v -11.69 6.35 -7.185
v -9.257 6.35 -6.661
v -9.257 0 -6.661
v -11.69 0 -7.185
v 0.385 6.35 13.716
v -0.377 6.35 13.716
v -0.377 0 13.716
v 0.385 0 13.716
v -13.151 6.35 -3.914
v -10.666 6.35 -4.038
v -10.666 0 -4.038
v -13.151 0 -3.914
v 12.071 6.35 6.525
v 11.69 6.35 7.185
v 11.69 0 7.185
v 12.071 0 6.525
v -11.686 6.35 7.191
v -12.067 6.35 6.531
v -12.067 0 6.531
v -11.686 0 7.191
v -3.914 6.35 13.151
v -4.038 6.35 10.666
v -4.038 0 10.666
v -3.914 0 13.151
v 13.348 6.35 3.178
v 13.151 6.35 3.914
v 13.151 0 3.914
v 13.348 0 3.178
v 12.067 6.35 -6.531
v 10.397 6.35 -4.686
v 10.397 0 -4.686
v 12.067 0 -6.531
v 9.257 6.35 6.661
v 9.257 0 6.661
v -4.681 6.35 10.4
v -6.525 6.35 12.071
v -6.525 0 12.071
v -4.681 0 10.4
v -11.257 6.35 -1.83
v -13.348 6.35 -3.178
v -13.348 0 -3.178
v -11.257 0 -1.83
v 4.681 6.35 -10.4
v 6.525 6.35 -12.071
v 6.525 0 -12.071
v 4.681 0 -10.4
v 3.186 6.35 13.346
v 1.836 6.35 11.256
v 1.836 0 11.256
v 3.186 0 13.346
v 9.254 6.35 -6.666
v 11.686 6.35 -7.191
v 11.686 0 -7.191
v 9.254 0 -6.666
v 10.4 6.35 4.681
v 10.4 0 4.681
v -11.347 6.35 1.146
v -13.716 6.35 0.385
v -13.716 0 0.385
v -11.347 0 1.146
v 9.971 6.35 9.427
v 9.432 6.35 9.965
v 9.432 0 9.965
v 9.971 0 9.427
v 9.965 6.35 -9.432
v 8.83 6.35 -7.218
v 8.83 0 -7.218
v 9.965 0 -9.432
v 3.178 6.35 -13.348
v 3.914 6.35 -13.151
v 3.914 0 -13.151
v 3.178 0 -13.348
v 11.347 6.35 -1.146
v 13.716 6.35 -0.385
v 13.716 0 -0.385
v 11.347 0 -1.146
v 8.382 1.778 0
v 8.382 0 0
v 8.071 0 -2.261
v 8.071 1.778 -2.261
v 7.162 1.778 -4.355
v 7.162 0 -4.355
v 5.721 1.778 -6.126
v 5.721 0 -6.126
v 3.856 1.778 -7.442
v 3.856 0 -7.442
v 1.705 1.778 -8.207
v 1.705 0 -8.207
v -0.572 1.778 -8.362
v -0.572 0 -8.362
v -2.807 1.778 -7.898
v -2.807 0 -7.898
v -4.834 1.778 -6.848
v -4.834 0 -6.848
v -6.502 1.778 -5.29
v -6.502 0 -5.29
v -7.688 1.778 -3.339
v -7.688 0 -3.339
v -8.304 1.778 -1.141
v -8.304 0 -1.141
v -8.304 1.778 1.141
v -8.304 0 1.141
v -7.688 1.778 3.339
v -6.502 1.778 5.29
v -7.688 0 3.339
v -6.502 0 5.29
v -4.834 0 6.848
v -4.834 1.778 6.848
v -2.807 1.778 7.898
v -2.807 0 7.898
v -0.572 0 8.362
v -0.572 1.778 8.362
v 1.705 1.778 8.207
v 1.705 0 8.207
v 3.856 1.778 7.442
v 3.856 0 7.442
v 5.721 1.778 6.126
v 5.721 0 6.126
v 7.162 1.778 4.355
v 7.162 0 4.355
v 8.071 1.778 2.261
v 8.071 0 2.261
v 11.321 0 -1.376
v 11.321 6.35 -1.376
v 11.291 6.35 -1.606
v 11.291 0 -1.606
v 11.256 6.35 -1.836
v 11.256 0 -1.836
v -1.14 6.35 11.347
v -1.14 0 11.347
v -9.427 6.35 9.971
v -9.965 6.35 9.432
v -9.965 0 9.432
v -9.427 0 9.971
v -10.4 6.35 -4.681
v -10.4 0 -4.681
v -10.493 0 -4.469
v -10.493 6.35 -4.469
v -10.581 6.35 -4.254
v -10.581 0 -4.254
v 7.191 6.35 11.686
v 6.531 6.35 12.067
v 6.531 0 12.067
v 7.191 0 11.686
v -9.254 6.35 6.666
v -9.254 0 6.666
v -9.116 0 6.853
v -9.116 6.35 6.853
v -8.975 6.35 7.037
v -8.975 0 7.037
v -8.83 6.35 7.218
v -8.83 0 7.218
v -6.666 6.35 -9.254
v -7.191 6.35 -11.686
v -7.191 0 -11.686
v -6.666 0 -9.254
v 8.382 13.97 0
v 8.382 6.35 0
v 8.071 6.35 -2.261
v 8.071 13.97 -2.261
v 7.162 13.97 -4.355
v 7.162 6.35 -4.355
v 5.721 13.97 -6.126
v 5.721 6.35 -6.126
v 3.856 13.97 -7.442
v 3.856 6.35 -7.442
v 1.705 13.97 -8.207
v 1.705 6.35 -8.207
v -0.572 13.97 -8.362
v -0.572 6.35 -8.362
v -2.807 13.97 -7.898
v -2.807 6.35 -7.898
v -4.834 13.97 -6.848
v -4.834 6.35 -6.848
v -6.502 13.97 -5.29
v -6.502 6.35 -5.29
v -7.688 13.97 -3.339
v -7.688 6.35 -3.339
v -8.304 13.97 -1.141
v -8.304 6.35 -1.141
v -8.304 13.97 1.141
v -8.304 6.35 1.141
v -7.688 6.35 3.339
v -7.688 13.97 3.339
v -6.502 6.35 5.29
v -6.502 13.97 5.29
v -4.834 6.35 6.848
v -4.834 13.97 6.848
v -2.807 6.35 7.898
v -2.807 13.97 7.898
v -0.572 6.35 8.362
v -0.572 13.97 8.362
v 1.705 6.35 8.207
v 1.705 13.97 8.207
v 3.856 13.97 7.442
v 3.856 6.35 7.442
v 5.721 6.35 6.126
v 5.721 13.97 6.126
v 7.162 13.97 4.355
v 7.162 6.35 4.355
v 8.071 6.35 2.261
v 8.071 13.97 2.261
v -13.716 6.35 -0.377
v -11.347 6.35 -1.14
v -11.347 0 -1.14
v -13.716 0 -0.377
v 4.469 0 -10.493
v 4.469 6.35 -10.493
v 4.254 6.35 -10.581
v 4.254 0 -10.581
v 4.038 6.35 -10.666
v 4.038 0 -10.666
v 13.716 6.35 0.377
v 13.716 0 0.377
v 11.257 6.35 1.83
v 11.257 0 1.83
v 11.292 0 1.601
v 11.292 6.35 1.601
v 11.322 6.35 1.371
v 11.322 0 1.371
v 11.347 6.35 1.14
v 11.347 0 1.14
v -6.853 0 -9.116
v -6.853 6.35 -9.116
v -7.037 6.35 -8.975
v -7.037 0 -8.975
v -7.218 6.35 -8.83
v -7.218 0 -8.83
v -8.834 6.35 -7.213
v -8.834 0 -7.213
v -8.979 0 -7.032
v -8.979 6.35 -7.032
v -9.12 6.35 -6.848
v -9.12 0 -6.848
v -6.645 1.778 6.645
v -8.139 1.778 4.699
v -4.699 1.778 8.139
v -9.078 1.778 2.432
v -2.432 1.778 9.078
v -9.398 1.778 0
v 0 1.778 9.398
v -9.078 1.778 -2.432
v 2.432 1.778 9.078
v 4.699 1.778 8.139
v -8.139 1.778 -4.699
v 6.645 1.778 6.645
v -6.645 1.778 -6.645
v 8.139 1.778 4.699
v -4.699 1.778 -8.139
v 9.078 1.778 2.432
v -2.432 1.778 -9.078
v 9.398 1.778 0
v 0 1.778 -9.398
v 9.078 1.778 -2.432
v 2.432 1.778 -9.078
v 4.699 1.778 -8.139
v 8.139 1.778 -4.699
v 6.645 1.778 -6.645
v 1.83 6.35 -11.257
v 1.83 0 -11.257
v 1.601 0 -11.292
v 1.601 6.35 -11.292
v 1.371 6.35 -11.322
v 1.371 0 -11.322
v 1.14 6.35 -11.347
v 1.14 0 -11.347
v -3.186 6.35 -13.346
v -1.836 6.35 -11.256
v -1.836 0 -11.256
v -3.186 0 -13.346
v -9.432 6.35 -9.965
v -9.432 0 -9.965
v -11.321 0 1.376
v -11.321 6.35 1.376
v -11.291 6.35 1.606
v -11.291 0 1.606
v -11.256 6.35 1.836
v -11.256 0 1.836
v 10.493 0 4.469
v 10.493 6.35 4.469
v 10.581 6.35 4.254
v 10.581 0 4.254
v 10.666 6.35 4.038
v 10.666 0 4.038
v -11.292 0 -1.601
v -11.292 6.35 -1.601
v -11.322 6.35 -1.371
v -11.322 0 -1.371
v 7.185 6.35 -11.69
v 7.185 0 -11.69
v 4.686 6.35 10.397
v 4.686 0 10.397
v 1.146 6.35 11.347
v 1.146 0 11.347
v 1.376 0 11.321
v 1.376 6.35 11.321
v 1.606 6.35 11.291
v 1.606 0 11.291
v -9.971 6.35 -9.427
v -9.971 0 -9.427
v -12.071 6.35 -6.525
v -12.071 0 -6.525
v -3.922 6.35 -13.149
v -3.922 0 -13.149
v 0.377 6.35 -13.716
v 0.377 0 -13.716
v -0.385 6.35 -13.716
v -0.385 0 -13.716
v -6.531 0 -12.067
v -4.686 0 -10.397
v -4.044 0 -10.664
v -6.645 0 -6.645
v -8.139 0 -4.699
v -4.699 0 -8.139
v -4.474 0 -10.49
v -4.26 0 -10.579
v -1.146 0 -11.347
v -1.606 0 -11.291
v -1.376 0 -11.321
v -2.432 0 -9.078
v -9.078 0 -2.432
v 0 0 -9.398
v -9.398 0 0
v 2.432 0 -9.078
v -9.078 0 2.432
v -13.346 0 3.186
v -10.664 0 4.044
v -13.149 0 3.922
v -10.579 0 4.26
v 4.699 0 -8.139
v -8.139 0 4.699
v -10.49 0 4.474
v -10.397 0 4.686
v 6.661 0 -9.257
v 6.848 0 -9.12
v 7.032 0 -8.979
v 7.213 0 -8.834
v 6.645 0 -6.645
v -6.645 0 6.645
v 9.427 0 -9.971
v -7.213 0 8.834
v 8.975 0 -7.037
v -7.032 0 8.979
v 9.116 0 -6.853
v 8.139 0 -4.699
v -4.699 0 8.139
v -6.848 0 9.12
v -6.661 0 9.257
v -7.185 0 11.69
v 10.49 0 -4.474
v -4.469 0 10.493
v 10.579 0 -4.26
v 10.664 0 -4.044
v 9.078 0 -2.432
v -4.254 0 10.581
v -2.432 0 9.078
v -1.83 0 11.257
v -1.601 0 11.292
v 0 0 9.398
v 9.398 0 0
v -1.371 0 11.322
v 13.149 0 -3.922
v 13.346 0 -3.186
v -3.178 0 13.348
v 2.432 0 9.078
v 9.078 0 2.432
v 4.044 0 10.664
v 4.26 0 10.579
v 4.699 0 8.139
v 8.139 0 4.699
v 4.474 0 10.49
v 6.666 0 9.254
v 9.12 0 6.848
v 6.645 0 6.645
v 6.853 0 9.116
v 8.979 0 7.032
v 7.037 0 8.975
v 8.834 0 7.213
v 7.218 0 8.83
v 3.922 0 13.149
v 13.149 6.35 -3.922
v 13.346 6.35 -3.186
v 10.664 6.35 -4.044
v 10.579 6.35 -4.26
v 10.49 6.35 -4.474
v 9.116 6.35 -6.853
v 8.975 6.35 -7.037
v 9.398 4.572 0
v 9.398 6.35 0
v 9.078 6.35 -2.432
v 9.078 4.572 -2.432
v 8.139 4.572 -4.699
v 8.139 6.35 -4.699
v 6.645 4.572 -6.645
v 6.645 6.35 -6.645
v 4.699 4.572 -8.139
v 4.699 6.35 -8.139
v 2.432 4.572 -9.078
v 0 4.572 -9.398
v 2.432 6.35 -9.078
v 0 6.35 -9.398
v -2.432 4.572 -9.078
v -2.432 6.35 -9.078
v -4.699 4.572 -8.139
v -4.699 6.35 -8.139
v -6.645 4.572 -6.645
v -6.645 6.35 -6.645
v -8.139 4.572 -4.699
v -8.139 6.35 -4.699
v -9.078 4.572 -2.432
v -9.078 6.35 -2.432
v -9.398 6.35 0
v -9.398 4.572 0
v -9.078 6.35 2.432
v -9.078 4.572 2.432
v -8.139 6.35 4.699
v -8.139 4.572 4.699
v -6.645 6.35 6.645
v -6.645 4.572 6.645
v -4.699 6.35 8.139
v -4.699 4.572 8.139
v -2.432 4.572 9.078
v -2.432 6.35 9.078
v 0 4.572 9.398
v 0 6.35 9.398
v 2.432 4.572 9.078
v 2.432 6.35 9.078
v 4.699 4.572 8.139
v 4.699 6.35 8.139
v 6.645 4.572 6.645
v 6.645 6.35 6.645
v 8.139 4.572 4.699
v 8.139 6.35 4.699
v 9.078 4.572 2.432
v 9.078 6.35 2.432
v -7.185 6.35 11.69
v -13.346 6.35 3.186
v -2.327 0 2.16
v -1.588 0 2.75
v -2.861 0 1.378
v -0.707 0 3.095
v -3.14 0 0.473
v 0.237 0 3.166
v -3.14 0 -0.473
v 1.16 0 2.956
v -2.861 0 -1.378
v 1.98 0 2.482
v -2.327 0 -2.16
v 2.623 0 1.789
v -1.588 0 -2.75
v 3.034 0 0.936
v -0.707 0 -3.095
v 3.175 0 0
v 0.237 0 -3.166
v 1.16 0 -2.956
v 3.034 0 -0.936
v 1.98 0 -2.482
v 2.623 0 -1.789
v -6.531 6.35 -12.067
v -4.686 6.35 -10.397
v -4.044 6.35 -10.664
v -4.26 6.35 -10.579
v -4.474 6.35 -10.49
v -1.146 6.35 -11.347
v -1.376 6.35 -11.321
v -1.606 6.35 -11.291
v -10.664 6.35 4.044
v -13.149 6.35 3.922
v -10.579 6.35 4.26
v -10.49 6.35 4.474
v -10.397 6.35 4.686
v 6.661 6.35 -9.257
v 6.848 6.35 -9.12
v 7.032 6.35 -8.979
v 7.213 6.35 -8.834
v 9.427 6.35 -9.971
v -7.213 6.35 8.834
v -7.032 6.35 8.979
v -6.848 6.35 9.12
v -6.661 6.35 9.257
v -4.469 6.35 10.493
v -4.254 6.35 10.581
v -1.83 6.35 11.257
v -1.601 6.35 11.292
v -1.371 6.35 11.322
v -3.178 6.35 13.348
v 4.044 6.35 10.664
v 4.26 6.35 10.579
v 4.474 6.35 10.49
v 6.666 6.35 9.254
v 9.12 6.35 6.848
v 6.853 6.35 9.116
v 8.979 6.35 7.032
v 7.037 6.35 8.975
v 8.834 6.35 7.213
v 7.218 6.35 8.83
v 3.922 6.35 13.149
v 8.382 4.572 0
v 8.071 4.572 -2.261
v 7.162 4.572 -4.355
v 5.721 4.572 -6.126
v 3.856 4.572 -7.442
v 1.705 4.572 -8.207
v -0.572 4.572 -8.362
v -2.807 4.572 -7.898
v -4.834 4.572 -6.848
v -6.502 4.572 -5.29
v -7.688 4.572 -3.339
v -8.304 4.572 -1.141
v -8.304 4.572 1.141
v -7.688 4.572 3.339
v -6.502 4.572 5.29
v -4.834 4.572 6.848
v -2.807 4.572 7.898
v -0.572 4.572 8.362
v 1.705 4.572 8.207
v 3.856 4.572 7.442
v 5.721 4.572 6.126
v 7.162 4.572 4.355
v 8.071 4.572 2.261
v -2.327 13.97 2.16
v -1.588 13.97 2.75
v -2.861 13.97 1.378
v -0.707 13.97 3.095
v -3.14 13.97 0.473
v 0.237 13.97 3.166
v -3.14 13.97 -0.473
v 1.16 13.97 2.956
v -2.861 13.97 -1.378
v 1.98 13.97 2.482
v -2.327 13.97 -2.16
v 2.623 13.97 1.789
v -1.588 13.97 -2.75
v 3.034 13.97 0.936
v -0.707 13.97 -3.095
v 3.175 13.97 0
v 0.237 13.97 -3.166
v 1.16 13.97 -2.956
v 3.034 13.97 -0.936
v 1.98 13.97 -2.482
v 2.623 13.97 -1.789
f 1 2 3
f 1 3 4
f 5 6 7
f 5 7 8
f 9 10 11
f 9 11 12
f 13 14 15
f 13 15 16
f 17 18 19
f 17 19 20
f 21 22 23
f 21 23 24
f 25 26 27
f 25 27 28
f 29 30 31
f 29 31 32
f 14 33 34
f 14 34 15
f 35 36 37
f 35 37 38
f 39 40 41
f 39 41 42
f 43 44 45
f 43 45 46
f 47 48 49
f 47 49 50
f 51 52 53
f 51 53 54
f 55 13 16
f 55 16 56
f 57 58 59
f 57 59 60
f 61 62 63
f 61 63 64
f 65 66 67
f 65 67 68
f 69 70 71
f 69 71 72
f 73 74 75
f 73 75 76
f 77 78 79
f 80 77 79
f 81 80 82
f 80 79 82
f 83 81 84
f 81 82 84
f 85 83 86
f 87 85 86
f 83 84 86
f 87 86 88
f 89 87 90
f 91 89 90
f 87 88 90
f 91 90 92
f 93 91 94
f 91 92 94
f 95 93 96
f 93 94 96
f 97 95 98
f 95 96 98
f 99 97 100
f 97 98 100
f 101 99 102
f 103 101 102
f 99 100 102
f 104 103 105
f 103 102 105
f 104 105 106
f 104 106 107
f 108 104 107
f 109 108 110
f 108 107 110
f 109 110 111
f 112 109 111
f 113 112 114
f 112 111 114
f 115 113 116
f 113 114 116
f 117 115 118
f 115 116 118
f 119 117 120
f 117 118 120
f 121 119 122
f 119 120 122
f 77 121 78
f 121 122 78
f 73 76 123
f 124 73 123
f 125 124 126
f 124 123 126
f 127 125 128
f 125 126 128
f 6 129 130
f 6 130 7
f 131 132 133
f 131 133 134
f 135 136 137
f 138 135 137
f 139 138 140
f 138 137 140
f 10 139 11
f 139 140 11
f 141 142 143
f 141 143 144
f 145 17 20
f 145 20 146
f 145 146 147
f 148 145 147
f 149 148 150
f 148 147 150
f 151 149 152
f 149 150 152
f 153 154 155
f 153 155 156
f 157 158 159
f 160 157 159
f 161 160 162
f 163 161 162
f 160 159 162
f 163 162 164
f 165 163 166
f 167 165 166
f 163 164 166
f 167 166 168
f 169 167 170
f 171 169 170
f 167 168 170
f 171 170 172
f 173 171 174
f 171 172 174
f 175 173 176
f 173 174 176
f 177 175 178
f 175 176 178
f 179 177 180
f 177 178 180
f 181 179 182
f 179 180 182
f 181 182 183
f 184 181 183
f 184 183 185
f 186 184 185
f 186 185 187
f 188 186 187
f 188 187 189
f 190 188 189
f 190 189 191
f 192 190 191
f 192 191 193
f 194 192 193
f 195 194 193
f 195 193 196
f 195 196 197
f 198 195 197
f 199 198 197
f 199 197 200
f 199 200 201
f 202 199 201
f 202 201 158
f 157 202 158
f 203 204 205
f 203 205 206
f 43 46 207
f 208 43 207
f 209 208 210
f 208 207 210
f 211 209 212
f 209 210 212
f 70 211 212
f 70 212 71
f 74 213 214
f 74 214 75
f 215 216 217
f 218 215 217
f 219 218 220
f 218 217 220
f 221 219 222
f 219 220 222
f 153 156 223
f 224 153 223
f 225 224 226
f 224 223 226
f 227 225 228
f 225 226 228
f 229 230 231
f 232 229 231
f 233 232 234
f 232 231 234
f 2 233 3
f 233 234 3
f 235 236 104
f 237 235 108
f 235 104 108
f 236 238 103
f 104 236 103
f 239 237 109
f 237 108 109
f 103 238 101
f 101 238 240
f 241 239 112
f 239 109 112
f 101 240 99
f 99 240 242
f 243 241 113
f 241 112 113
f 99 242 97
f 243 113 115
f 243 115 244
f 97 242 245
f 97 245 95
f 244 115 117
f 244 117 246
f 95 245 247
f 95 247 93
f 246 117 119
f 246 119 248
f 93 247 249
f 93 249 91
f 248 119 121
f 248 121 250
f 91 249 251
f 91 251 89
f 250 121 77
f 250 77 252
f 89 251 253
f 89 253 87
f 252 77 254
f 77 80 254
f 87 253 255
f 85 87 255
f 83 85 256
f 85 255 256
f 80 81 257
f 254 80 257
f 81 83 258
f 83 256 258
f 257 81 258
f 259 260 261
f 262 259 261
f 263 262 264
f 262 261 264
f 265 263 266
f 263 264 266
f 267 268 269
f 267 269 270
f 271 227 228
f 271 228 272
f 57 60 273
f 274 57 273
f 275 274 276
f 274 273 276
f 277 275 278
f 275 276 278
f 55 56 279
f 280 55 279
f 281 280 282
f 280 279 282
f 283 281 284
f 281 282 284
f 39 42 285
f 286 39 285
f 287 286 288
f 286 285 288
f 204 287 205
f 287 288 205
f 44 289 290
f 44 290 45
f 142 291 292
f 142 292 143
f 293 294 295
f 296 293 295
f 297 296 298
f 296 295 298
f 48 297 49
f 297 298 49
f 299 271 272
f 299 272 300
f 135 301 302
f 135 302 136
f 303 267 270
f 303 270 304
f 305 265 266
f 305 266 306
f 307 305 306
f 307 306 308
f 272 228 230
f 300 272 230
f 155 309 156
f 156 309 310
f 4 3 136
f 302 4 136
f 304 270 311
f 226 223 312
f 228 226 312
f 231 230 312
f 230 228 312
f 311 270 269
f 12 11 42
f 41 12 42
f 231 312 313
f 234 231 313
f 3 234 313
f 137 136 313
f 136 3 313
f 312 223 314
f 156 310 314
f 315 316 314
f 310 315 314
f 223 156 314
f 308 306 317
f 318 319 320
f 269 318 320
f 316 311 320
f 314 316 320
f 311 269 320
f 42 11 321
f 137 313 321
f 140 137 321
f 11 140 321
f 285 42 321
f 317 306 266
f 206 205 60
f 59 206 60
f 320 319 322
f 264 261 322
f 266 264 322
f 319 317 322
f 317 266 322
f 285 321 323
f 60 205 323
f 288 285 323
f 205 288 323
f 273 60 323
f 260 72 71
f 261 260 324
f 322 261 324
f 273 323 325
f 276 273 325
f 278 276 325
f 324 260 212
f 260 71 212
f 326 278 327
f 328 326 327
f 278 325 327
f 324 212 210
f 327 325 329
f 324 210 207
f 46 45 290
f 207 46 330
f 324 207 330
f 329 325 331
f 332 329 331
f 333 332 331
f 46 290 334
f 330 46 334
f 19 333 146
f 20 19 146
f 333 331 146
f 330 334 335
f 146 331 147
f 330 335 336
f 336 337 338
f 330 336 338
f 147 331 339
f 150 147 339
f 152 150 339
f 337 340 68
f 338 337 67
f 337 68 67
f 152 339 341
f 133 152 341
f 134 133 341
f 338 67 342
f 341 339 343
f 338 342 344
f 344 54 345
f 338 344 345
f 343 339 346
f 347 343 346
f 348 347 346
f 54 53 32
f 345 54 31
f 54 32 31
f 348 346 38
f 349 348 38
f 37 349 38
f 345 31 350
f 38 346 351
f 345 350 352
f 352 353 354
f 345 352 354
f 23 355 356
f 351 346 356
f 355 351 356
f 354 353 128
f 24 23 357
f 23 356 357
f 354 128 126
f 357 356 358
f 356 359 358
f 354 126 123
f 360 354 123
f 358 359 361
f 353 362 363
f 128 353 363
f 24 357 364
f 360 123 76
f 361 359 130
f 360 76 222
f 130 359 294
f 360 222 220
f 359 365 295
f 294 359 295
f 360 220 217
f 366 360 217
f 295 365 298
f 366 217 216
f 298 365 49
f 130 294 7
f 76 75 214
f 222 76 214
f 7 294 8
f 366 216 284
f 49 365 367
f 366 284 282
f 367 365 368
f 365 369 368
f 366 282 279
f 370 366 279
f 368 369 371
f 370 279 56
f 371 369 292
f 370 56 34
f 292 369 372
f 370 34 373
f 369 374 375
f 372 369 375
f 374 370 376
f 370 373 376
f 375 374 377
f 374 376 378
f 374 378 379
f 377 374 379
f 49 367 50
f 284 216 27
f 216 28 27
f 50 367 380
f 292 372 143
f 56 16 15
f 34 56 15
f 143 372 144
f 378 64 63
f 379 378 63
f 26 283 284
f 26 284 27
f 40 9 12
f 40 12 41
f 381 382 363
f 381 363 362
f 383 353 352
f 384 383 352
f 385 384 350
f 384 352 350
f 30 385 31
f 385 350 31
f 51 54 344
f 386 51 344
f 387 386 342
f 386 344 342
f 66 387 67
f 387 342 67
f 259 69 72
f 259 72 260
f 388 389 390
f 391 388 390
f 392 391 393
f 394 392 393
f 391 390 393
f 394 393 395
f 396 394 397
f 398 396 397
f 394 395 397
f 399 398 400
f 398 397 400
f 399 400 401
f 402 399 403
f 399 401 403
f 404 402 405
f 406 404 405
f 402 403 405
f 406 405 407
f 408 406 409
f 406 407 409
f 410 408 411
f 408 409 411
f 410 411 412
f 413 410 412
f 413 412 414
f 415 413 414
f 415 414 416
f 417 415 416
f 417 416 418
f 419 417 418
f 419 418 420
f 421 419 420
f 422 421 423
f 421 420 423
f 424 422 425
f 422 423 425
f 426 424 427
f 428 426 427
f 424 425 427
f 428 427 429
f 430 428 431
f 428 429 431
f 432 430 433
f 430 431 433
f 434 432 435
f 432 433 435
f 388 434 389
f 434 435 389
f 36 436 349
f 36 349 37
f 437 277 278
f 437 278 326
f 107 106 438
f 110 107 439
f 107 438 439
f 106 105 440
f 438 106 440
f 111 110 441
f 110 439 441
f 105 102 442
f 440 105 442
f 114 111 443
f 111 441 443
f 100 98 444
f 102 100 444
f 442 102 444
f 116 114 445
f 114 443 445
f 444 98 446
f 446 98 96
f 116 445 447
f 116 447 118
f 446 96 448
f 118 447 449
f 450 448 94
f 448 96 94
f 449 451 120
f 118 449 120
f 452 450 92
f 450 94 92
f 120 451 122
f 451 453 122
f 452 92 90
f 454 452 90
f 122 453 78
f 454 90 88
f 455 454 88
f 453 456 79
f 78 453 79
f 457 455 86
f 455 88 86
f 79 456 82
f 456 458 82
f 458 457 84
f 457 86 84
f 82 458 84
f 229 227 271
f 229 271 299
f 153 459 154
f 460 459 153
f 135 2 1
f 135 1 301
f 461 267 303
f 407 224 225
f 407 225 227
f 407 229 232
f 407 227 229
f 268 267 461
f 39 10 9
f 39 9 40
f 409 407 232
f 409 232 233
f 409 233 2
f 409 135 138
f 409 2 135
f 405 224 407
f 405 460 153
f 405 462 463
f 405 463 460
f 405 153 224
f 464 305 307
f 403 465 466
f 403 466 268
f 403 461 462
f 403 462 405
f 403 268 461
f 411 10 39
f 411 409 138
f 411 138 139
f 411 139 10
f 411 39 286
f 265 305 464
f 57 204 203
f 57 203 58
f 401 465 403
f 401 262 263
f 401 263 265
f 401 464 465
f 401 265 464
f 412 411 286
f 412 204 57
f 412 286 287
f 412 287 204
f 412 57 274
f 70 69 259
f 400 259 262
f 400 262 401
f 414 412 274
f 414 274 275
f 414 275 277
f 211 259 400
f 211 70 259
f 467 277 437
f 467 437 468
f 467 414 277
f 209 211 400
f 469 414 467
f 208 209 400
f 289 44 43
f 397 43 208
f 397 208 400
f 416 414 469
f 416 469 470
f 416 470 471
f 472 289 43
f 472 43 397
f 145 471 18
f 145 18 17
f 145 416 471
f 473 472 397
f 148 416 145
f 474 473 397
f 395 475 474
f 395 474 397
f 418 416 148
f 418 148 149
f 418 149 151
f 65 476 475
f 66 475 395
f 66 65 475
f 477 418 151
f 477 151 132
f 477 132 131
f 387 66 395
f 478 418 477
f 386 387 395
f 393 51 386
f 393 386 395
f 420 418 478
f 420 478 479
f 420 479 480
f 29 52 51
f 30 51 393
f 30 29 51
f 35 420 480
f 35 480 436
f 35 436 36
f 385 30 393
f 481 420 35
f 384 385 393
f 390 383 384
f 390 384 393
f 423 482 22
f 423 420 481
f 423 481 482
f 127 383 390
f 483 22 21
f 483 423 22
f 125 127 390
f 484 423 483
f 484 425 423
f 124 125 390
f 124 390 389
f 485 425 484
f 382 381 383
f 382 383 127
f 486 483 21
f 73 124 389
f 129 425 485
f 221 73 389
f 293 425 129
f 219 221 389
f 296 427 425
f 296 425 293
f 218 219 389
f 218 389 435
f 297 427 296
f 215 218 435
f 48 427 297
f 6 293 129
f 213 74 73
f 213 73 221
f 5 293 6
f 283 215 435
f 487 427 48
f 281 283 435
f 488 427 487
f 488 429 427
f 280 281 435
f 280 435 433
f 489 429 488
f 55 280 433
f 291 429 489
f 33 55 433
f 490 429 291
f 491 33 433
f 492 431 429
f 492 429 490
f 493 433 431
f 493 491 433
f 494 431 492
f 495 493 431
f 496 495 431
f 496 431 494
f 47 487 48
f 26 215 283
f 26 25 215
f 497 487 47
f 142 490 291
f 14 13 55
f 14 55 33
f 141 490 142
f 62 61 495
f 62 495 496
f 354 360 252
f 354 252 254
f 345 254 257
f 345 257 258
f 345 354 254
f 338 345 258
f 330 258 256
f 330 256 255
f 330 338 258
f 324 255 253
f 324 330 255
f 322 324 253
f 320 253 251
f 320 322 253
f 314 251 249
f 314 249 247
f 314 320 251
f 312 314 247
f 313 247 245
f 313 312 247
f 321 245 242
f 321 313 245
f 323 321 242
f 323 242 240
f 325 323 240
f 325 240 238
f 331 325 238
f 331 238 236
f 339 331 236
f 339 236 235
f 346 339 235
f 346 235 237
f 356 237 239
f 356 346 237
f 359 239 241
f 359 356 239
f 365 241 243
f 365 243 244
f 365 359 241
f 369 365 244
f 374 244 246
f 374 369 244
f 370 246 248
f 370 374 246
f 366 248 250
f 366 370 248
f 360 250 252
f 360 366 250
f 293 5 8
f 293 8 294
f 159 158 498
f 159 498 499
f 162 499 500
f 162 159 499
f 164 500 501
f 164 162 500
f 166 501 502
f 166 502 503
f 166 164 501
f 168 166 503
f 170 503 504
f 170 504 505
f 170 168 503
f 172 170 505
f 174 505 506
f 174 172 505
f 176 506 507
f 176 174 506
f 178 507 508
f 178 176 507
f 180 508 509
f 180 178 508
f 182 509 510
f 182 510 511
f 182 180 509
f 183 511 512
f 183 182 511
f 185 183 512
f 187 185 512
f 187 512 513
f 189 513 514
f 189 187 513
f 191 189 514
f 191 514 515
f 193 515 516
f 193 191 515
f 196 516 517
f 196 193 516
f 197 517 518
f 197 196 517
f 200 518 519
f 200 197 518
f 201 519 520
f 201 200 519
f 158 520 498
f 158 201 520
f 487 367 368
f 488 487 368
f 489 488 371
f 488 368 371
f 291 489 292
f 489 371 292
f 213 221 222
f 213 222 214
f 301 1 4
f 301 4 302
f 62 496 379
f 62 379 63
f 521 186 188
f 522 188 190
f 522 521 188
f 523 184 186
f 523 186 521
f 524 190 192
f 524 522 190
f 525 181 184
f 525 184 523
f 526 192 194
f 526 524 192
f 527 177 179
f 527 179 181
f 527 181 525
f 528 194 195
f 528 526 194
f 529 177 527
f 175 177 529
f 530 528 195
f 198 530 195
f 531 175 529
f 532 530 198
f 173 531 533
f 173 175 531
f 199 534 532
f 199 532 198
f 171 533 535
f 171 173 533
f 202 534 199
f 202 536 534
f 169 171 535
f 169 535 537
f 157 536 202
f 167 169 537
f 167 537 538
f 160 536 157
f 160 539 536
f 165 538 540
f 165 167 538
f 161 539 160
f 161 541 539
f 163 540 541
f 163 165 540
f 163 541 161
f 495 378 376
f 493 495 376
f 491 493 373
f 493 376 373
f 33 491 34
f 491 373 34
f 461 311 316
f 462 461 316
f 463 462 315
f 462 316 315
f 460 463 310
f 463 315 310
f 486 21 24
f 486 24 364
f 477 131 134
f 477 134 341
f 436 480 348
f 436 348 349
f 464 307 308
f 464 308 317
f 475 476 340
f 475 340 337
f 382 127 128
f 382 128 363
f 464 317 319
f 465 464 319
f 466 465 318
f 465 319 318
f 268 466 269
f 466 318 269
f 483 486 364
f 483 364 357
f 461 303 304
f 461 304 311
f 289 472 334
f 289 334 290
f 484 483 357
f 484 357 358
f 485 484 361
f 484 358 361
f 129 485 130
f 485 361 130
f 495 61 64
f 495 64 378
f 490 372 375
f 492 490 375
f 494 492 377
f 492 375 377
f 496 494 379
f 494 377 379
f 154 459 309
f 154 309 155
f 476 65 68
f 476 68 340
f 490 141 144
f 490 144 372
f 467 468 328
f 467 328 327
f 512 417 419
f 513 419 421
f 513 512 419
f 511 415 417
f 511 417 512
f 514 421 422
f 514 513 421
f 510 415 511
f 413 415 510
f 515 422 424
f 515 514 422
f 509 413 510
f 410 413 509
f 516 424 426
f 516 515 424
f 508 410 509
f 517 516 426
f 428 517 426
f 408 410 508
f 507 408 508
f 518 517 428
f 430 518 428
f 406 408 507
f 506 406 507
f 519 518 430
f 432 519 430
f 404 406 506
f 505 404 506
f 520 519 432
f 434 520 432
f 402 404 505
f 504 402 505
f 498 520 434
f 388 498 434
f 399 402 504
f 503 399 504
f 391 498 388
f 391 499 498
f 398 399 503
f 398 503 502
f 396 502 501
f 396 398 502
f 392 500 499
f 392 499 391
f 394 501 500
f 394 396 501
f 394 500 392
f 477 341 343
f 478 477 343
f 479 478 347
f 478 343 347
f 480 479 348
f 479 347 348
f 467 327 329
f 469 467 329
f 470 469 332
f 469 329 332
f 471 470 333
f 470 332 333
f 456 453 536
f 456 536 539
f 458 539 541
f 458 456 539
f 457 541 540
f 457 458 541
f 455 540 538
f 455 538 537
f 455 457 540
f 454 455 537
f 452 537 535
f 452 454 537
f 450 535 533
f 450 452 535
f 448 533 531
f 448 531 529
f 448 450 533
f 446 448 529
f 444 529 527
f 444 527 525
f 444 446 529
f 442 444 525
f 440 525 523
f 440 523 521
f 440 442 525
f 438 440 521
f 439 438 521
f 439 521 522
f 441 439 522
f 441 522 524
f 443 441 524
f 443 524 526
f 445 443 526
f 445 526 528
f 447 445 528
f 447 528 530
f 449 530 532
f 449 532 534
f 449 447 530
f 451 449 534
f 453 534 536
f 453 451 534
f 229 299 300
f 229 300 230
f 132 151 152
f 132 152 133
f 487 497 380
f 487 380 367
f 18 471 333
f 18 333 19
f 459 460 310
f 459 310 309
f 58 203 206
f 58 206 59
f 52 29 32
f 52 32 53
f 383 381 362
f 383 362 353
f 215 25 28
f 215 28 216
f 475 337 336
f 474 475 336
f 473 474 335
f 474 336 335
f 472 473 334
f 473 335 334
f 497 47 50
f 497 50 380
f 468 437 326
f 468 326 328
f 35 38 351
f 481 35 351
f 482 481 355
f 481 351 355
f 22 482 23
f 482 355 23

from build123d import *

# Parameters (mm, degrees)
SKETCH1_R           = 11.4046
SKETCH1_R_2         = 8.382
BOSS_EXTRUDE1_DEPTH = 6.35
SKETCH1_3_R         = 8.382
SKETCH1_3_R_2       = 3.175
BOSS_EXTRUDE2_DEPTH = 13.97
SKETCH1_4_R         = 9.398
SKETCH1_4_R_2       = 8.382
CUT_EXTRUDE1_DEPTH  = 1.778
CUT_EXTRUDE3_START  = 4.572
SKETCH1_8_R         = 9.398
SKETCH1_8_R_2       = 8.382
CUT_EXTRUDE3_DEPTH  = 1.778
BOSS_EXTRUDE3_START = -6.35
BOSS_EXTRUDE3_DEPTH = 6.35
CIRPATTERN1_COUNT   = 24


with BuildPart() as part:
    # Sketch1 → Boss-Extrude1 (new body)
    with BuildSketch(Plane(origin=(0, 0, 0), x_dir=(1, 0, 0), z_dir=(0, 1, 0))):
        Circle(SKETCH1_R)
        Circle(SKETCH1_R_2, mode=Mode.SUBTRACT)
    extrude(amount=BOSS_EXTRUDE1_DEPTH)

    # Sketch1<3> → Boss-Extrude2 (add)
    with BuildSketch(Plane(origin=(0, 0, 0), x_dir=(1, 0, 0), z_dir=(0, 1, 0))):
        Circle(SKETCH1_3_R)
        Circle(SKETCH1_3_R_2, mode=Mode.SUBTRACT)
    extrude(amount=BOSS_EXTRUDE2_DEPTH)

    # Sketch1<4> → Cut-Extrude1 (cut)
    with BuildSketch(Plane(origin=(0, 0, 0), x_dir=(1, 0, 0), z_dir=(0, 1, 0))):
        Circle(SKETCH1_4_R)
        Circle(SKETCH1_4_R_2, mode=Mode.SUBTRACT)
    extrude(amount=CUT_EXTRUDE1_DEPTH, mode=Mode.SUBTRACT)

    # Sketch1<8> → Cut-Extrude3 (cut)
    with BuildSketch(Plane(origin=(0, 0, 0), x_dir=(1, 0, 0), z_dir=(0, 1, 0)).offset(CUT_EXTRUDE3_START)):
        Circle(SKETCH1_8_R)
        Circle(SKETCH1_8_R_2, mode=Mode.SUBTRACT)
    extrude(amount=CUT_EXTRUDE3_DEPTH, mode=Mode.SUBTRACT)

    # Sketch2 → Boss-Extrude3 (add)
    with BuildSketch(Plane(origin=(0, 6.35, 0), x_dir=(1, 0, 0), z_dir=(0, 1, 0)).offset(BOSS_EXTRUDE3_START)):
        with BuildLine():
            Line((0.3772543, 13.715999489), (-0.3847457, 13.715999489))
            Line((-0.3847457, 13.715999489), (-1.145852444, 11.34689047))
            ThreePointArc((-1.145852444, 11.34689047), (-0.002866915, 11.40459964), (1.140147484, 11.34746513))
            Line((1.140147484, 11.34746513), (0.3772543, 13.715999489))
        make_face()
    boss_extrude3 = extrude(amount=BOSS_EXTRUDE3_DEPTH)

    # CirPattern1: Boss-Extrude3 ×24 about axis
    cirpattern1_axis = Axis((0, 6.35, 0), (0, -1, 0))
    for i in range(1, CIRPATTERN1_COUNT):
        add(boss_extrude3.rotate(cirpattern1_axis, i * 360 / CIRPATTERN1_COUNT))


solid = part.part
